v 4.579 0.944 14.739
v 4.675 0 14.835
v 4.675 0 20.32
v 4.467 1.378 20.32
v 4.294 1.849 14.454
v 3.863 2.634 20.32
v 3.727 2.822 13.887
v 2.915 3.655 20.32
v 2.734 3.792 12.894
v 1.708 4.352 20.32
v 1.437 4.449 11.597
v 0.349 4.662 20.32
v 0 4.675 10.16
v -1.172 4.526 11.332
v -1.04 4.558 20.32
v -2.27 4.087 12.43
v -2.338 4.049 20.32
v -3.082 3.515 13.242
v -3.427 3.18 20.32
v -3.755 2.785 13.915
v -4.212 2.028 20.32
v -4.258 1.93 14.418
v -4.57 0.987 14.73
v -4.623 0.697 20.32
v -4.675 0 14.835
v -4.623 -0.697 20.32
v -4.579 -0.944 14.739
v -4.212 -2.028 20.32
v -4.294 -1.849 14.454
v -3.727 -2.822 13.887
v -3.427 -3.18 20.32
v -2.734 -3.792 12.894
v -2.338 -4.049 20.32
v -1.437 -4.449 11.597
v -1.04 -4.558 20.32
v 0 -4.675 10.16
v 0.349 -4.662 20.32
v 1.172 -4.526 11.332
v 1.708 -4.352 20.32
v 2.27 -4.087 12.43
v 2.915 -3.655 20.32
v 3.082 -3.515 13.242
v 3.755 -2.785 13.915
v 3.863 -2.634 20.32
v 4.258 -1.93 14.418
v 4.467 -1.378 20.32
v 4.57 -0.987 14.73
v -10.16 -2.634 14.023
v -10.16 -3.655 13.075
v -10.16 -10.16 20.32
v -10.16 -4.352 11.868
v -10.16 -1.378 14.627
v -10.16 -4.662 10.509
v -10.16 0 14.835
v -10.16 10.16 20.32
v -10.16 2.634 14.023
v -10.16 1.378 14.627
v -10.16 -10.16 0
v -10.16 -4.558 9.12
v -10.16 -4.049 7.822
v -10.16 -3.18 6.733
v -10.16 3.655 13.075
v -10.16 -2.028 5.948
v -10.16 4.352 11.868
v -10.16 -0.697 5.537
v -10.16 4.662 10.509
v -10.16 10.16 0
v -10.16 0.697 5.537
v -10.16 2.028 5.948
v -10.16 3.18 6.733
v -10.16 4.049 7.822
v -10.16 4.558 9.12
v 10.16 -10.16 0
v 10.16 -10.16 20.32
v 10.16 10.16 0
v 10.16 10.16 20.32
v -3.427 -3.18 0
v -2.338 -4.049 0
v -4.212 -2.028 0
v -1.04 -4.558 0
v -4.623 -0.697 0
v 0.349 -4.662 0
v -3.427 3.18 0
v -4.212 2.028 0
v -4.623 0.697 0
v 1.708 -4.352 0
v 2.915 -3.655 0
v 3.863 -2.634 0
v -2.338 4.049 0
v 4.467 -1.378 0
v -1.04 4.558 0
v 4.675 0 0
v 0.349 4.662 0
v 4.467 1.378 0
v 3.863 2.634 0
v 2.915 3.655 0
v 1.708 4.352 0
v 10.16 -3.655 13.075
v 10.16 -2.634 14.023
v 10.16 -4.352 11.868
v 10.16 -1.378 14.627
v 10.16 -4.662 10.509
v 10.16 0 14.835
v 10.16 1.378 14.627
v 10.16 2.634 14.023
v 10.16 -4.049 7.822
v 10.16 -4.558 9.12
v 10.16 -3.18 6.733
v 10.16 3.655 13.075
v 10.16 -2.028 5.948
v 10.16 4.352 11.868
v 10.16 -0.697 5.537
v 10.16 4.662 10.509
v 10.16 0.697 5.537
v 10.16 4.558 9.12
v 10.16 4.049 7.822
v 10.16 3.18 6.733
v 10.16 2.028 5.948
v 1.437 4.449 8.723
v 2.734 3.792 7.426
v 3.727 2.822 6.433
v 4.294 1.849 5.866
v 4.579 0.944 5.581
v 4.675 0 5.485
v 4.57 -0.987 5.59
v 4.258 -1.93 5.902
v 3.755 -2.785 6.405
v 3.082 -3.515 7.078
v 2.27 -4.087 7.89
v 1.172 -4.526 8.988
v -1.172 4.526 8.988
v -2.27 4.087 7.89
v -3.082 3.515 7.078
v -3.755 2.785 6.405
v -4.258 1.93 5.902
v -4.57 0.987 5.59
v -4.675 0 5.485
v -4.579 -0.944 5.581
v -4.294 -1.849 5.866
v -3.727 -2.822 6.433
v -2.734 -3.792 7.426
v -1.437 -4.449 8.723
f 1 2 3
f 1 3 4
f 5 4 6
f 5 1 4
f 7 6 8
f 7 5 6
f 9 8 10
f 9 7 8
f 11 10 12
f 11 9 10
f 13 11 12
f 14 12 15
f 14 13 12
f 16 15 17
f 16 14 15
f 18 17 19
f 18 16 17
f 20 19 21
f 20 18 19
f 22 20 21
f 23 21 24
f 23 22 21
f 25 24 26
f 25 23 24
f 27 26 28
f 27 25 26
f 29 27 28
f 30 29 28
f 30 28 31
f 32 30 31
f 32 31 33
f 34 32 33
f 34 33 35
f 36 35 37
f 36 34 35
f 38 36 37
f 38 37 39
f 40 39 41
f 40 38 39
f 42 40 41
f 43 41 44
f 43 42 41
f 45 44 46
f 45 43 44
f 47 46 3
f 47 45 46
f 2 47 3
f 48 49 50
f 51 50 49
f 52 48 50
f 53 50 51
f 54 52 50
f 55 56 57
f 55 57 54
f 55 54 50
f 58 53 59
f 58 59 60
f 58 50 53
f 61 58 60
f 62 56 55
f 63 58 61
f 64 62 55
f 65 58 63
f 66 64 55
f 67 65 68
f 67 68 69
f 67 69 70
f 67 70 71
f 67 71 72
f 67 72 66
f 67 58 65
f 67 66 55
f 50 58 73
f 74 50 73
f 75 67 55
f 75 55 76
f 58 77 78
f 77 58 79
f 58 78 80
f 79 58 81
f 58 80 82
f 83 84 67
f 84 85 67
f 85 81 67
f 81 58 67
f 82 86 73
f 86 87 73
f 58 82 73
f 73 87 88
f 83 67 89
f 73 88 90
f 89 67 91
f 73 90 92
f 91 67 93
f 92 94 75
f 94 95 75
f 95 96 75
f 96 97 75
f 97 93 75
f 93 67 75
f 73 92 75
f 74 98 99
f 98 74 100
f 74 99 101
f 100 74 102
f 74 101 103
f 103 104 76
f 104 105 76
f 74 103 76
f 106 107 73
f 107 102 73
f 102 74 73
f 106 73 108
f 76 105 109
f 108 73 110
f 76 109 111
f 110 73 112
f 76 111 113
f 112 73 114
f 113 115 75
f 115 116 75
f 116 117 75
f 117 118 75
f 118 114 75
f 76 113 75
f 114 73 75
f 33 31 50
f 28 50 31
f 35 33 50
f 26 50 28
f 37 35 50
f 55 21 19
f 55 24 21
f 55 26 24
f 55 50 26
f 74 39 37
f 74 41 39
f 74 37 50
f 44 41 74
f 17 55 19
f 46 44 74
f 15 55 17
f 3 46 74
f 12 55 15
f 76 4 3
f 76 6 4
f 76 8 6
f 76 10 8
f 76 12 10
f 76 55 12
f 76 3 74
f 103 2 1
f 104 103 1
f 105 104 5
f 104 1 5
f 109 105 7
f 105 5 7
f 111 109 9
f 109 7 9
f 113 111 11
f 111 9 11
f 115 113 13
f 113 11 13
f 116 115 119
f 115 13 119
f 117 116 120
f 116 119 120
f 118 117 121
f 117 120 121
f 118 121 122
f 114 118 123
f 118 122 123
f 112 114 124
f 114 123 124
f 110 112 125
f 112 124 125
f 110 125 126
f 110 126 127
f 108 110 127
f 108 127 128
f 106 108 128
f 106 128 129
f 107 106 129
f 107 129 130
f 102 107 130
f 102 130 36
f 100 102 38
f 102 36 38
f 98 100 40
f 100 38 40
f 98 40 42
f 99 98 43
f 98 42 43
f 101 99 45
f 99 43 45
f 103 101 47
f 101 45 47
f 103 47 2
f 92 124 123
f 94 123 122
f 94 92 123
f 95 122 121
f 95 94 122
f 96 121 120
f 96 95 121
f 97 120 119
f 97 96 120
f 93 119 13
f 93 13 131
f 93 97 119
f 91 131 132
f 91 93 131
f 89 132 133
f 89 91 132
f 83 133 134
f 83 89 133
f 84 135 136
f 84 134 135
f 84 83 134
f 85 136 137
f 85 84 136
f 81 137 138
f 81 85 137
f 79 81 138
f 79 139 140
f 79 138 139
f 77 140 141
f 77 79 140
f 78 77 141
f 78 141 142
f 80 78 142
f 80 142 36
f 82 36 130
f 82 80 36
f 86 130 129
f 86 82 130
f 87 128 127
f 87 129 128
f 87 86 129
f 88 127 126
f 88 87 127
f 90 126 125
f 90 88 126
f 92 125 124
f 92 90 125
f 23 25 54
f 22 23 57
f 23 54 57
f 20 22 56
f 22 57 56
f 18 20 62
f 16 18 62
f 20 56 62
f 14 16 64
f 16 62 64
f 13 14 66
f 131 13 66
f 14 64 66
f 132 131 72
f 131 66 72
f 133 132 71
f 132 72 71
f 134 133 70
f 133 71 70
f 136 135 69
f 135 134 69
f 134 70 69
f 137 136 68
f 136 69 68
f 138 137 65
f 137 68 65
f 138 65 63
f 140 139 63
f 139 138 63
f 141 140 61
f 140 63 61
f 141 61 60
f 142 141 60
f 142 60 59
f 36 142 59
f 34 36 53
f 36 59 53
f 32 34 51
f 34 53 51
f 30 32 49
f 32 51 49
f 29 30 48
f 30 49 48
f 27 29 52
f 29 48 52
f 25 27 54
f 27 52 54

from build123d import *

# Parameters (mm, degrees)
SKETCH1_W                      = 20.32
SKETCH1_H                      = 20.32
SKETCH1_R                      = 4.675
BOSS_EXTRUDE1_DEPTH            = 20.32
F_20_0_20_DIAMETER_HOLE1_D     = 9.35
F_20_0_20_DIAMETER_HOLE1_DEPTH = 20.32
F_20_0_20_DIAMETER_HOLE1_TIP   = 2.809023394


with BuildPart() as part:
    # Sketch1 → Boss-Extrude1 (new body)
    with BuildSketch(Plane.XY):
        Rectangle(SKETCH1_W, SKETCH1_H)
        Circle(SKETCH1_R, mode=Mode.SUBTRACT)
    extrude(amount=BOSS_EXTRUDE1_DEPTH)

    # Ø20.0 (20) Diameter Hole1
    with Locations(Plane(origin=(10.16, 0, 0), x_dir=(0, 0, -1), z_dir=(1, 0, 0))):
        with Locations((-10.16, 0)):
            Hole(F_20_0_20_DIAMETER_HOLE1_D / 2, depth=F_20_0_20_DIAMETER_HOLE1_DEPTH)
            with Locations((0, 0, -(F_20_0_20_DIAMETER_HOLE1_DEPTH + F_20_0_20_DIAMETER_HOLE1_TIP / 2))):  # 118° drill point
                Cone(0, F_20_0_20_DIAMETER_HOLE1_D / 2, F_20_0_20_DIAMETER_HOLE1_TIP, mode=Mode.SUBTRACT)


solid = part.part
